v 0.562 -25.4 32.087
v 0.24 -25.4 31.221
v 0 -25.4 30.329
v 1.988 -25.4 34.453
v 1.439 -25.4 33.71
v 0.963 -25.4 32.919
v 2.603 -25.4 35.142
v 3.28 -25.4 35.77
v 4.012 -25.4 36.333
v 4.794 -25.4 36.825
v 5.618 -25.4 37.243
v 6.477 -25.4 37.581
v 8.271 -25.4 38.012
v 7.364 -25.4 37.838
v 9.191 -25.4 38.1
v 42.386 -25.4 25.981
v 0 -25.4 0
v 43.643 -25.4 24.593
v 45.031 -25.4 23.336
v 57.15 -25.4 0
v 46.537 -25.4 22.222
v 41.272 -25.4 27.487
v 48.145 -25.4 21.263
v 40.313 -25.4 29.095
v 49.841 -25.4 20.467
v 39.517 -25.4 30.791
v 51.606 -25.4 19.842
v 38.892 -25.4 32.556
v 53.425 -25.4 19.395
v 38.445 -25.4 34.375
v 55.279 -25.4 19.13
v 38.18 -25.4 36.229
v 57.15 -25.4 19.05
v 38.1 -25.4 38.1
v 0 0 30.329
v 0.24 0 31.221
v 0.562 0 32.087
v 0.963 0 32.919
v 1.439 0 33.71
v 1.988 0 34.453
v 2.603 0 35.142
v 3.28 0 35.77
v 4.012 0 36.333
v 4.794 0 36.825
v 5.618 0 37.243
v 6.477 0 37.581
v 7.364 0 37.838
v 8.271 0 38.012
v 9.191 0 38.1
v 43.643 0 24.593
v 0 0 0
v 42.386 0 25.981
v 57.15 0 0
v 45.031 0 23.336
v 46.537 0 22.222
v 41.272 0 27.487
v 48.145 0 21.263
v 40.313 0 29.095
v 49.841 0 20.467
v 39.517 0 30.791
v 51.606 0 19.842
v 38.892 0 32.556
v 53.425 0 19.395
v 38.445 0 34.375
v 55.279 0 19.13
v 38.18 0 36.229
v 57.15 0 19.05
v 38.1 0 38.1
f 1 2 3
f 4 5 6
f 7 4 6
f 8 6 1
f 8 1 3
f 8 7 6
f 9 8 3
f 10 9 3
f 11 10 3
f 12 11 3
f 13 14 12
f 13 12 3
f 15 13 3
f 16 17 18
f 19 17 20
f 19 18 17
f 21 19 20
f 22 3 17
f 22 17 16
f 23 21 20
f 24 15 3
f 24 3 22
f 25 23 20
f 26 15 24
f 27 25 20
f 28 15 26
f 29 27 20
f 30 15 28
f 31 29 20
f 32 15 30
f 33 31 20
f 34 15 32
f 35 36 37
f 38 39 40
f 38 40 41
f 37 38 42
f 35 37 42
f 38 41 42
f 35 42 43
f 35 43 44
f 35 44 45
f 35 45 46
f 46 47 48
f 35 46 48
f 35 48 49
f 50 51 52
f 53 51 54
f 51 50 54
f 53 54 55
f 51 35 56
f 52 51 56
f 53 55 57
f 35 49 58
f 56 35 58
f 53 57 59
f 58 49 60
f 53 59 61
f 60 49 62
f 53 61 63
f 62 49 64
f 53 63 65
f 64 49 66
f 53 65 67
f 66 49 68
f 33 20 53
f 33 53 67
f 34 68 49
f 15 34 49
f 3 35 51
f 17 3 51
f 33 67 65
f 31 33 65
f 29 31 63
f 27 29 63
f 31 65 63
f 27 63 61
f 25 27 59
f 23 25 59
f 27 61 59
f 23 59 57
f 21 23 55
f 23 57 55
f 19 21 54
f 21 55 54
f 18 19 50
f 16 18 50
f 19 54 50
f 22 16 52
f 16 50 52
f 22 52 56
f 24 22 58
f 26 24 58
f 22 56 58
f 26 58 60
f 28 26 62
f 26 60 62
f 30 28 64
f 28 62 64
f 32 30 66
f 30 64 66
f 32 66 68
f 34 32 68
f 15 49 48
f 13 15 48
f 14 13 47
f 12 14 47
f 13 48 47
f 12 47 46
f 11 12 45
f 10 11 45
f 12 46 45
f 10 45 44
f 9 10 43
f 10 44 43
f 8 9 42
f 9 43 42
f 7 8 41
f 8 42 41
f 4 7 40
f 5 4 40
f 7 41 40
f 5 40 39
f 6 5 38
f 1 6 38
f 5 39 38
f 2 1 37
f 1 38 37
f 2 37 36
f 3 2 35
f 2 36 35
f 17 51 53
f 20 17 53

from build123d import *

# Parameters (mm, degrees)
F1_DEPTH = 25.4


with BuildPart() as f1:
    # F0 (on Front) → F1 (new body)
    with BuildSketch(Plane.XZ):
        with BuildLine():
            Line((0, 26.083848), (0, 0))
            Line((0, 0), (57.15, 0))
            Line((57.15, 0), (57.15, 19.05))
            ThreePointArc((57.15, 19.05), (43.643284, 24.593284), (38.1, 38.1))
            Line((38.1, 38.1), (10.160001, 38.1))
            Line((10.160001, 38.1), (9.190616, 38.1))
            ThreePointArc((9.190616, 38.1), (3.279744, 35.770442), (0, 30.329071))
            Line((0, 30.329071), (0, 26.083848))
        make_face()
    extrude(amount=F1_DEPTH)


solid = f1.part
